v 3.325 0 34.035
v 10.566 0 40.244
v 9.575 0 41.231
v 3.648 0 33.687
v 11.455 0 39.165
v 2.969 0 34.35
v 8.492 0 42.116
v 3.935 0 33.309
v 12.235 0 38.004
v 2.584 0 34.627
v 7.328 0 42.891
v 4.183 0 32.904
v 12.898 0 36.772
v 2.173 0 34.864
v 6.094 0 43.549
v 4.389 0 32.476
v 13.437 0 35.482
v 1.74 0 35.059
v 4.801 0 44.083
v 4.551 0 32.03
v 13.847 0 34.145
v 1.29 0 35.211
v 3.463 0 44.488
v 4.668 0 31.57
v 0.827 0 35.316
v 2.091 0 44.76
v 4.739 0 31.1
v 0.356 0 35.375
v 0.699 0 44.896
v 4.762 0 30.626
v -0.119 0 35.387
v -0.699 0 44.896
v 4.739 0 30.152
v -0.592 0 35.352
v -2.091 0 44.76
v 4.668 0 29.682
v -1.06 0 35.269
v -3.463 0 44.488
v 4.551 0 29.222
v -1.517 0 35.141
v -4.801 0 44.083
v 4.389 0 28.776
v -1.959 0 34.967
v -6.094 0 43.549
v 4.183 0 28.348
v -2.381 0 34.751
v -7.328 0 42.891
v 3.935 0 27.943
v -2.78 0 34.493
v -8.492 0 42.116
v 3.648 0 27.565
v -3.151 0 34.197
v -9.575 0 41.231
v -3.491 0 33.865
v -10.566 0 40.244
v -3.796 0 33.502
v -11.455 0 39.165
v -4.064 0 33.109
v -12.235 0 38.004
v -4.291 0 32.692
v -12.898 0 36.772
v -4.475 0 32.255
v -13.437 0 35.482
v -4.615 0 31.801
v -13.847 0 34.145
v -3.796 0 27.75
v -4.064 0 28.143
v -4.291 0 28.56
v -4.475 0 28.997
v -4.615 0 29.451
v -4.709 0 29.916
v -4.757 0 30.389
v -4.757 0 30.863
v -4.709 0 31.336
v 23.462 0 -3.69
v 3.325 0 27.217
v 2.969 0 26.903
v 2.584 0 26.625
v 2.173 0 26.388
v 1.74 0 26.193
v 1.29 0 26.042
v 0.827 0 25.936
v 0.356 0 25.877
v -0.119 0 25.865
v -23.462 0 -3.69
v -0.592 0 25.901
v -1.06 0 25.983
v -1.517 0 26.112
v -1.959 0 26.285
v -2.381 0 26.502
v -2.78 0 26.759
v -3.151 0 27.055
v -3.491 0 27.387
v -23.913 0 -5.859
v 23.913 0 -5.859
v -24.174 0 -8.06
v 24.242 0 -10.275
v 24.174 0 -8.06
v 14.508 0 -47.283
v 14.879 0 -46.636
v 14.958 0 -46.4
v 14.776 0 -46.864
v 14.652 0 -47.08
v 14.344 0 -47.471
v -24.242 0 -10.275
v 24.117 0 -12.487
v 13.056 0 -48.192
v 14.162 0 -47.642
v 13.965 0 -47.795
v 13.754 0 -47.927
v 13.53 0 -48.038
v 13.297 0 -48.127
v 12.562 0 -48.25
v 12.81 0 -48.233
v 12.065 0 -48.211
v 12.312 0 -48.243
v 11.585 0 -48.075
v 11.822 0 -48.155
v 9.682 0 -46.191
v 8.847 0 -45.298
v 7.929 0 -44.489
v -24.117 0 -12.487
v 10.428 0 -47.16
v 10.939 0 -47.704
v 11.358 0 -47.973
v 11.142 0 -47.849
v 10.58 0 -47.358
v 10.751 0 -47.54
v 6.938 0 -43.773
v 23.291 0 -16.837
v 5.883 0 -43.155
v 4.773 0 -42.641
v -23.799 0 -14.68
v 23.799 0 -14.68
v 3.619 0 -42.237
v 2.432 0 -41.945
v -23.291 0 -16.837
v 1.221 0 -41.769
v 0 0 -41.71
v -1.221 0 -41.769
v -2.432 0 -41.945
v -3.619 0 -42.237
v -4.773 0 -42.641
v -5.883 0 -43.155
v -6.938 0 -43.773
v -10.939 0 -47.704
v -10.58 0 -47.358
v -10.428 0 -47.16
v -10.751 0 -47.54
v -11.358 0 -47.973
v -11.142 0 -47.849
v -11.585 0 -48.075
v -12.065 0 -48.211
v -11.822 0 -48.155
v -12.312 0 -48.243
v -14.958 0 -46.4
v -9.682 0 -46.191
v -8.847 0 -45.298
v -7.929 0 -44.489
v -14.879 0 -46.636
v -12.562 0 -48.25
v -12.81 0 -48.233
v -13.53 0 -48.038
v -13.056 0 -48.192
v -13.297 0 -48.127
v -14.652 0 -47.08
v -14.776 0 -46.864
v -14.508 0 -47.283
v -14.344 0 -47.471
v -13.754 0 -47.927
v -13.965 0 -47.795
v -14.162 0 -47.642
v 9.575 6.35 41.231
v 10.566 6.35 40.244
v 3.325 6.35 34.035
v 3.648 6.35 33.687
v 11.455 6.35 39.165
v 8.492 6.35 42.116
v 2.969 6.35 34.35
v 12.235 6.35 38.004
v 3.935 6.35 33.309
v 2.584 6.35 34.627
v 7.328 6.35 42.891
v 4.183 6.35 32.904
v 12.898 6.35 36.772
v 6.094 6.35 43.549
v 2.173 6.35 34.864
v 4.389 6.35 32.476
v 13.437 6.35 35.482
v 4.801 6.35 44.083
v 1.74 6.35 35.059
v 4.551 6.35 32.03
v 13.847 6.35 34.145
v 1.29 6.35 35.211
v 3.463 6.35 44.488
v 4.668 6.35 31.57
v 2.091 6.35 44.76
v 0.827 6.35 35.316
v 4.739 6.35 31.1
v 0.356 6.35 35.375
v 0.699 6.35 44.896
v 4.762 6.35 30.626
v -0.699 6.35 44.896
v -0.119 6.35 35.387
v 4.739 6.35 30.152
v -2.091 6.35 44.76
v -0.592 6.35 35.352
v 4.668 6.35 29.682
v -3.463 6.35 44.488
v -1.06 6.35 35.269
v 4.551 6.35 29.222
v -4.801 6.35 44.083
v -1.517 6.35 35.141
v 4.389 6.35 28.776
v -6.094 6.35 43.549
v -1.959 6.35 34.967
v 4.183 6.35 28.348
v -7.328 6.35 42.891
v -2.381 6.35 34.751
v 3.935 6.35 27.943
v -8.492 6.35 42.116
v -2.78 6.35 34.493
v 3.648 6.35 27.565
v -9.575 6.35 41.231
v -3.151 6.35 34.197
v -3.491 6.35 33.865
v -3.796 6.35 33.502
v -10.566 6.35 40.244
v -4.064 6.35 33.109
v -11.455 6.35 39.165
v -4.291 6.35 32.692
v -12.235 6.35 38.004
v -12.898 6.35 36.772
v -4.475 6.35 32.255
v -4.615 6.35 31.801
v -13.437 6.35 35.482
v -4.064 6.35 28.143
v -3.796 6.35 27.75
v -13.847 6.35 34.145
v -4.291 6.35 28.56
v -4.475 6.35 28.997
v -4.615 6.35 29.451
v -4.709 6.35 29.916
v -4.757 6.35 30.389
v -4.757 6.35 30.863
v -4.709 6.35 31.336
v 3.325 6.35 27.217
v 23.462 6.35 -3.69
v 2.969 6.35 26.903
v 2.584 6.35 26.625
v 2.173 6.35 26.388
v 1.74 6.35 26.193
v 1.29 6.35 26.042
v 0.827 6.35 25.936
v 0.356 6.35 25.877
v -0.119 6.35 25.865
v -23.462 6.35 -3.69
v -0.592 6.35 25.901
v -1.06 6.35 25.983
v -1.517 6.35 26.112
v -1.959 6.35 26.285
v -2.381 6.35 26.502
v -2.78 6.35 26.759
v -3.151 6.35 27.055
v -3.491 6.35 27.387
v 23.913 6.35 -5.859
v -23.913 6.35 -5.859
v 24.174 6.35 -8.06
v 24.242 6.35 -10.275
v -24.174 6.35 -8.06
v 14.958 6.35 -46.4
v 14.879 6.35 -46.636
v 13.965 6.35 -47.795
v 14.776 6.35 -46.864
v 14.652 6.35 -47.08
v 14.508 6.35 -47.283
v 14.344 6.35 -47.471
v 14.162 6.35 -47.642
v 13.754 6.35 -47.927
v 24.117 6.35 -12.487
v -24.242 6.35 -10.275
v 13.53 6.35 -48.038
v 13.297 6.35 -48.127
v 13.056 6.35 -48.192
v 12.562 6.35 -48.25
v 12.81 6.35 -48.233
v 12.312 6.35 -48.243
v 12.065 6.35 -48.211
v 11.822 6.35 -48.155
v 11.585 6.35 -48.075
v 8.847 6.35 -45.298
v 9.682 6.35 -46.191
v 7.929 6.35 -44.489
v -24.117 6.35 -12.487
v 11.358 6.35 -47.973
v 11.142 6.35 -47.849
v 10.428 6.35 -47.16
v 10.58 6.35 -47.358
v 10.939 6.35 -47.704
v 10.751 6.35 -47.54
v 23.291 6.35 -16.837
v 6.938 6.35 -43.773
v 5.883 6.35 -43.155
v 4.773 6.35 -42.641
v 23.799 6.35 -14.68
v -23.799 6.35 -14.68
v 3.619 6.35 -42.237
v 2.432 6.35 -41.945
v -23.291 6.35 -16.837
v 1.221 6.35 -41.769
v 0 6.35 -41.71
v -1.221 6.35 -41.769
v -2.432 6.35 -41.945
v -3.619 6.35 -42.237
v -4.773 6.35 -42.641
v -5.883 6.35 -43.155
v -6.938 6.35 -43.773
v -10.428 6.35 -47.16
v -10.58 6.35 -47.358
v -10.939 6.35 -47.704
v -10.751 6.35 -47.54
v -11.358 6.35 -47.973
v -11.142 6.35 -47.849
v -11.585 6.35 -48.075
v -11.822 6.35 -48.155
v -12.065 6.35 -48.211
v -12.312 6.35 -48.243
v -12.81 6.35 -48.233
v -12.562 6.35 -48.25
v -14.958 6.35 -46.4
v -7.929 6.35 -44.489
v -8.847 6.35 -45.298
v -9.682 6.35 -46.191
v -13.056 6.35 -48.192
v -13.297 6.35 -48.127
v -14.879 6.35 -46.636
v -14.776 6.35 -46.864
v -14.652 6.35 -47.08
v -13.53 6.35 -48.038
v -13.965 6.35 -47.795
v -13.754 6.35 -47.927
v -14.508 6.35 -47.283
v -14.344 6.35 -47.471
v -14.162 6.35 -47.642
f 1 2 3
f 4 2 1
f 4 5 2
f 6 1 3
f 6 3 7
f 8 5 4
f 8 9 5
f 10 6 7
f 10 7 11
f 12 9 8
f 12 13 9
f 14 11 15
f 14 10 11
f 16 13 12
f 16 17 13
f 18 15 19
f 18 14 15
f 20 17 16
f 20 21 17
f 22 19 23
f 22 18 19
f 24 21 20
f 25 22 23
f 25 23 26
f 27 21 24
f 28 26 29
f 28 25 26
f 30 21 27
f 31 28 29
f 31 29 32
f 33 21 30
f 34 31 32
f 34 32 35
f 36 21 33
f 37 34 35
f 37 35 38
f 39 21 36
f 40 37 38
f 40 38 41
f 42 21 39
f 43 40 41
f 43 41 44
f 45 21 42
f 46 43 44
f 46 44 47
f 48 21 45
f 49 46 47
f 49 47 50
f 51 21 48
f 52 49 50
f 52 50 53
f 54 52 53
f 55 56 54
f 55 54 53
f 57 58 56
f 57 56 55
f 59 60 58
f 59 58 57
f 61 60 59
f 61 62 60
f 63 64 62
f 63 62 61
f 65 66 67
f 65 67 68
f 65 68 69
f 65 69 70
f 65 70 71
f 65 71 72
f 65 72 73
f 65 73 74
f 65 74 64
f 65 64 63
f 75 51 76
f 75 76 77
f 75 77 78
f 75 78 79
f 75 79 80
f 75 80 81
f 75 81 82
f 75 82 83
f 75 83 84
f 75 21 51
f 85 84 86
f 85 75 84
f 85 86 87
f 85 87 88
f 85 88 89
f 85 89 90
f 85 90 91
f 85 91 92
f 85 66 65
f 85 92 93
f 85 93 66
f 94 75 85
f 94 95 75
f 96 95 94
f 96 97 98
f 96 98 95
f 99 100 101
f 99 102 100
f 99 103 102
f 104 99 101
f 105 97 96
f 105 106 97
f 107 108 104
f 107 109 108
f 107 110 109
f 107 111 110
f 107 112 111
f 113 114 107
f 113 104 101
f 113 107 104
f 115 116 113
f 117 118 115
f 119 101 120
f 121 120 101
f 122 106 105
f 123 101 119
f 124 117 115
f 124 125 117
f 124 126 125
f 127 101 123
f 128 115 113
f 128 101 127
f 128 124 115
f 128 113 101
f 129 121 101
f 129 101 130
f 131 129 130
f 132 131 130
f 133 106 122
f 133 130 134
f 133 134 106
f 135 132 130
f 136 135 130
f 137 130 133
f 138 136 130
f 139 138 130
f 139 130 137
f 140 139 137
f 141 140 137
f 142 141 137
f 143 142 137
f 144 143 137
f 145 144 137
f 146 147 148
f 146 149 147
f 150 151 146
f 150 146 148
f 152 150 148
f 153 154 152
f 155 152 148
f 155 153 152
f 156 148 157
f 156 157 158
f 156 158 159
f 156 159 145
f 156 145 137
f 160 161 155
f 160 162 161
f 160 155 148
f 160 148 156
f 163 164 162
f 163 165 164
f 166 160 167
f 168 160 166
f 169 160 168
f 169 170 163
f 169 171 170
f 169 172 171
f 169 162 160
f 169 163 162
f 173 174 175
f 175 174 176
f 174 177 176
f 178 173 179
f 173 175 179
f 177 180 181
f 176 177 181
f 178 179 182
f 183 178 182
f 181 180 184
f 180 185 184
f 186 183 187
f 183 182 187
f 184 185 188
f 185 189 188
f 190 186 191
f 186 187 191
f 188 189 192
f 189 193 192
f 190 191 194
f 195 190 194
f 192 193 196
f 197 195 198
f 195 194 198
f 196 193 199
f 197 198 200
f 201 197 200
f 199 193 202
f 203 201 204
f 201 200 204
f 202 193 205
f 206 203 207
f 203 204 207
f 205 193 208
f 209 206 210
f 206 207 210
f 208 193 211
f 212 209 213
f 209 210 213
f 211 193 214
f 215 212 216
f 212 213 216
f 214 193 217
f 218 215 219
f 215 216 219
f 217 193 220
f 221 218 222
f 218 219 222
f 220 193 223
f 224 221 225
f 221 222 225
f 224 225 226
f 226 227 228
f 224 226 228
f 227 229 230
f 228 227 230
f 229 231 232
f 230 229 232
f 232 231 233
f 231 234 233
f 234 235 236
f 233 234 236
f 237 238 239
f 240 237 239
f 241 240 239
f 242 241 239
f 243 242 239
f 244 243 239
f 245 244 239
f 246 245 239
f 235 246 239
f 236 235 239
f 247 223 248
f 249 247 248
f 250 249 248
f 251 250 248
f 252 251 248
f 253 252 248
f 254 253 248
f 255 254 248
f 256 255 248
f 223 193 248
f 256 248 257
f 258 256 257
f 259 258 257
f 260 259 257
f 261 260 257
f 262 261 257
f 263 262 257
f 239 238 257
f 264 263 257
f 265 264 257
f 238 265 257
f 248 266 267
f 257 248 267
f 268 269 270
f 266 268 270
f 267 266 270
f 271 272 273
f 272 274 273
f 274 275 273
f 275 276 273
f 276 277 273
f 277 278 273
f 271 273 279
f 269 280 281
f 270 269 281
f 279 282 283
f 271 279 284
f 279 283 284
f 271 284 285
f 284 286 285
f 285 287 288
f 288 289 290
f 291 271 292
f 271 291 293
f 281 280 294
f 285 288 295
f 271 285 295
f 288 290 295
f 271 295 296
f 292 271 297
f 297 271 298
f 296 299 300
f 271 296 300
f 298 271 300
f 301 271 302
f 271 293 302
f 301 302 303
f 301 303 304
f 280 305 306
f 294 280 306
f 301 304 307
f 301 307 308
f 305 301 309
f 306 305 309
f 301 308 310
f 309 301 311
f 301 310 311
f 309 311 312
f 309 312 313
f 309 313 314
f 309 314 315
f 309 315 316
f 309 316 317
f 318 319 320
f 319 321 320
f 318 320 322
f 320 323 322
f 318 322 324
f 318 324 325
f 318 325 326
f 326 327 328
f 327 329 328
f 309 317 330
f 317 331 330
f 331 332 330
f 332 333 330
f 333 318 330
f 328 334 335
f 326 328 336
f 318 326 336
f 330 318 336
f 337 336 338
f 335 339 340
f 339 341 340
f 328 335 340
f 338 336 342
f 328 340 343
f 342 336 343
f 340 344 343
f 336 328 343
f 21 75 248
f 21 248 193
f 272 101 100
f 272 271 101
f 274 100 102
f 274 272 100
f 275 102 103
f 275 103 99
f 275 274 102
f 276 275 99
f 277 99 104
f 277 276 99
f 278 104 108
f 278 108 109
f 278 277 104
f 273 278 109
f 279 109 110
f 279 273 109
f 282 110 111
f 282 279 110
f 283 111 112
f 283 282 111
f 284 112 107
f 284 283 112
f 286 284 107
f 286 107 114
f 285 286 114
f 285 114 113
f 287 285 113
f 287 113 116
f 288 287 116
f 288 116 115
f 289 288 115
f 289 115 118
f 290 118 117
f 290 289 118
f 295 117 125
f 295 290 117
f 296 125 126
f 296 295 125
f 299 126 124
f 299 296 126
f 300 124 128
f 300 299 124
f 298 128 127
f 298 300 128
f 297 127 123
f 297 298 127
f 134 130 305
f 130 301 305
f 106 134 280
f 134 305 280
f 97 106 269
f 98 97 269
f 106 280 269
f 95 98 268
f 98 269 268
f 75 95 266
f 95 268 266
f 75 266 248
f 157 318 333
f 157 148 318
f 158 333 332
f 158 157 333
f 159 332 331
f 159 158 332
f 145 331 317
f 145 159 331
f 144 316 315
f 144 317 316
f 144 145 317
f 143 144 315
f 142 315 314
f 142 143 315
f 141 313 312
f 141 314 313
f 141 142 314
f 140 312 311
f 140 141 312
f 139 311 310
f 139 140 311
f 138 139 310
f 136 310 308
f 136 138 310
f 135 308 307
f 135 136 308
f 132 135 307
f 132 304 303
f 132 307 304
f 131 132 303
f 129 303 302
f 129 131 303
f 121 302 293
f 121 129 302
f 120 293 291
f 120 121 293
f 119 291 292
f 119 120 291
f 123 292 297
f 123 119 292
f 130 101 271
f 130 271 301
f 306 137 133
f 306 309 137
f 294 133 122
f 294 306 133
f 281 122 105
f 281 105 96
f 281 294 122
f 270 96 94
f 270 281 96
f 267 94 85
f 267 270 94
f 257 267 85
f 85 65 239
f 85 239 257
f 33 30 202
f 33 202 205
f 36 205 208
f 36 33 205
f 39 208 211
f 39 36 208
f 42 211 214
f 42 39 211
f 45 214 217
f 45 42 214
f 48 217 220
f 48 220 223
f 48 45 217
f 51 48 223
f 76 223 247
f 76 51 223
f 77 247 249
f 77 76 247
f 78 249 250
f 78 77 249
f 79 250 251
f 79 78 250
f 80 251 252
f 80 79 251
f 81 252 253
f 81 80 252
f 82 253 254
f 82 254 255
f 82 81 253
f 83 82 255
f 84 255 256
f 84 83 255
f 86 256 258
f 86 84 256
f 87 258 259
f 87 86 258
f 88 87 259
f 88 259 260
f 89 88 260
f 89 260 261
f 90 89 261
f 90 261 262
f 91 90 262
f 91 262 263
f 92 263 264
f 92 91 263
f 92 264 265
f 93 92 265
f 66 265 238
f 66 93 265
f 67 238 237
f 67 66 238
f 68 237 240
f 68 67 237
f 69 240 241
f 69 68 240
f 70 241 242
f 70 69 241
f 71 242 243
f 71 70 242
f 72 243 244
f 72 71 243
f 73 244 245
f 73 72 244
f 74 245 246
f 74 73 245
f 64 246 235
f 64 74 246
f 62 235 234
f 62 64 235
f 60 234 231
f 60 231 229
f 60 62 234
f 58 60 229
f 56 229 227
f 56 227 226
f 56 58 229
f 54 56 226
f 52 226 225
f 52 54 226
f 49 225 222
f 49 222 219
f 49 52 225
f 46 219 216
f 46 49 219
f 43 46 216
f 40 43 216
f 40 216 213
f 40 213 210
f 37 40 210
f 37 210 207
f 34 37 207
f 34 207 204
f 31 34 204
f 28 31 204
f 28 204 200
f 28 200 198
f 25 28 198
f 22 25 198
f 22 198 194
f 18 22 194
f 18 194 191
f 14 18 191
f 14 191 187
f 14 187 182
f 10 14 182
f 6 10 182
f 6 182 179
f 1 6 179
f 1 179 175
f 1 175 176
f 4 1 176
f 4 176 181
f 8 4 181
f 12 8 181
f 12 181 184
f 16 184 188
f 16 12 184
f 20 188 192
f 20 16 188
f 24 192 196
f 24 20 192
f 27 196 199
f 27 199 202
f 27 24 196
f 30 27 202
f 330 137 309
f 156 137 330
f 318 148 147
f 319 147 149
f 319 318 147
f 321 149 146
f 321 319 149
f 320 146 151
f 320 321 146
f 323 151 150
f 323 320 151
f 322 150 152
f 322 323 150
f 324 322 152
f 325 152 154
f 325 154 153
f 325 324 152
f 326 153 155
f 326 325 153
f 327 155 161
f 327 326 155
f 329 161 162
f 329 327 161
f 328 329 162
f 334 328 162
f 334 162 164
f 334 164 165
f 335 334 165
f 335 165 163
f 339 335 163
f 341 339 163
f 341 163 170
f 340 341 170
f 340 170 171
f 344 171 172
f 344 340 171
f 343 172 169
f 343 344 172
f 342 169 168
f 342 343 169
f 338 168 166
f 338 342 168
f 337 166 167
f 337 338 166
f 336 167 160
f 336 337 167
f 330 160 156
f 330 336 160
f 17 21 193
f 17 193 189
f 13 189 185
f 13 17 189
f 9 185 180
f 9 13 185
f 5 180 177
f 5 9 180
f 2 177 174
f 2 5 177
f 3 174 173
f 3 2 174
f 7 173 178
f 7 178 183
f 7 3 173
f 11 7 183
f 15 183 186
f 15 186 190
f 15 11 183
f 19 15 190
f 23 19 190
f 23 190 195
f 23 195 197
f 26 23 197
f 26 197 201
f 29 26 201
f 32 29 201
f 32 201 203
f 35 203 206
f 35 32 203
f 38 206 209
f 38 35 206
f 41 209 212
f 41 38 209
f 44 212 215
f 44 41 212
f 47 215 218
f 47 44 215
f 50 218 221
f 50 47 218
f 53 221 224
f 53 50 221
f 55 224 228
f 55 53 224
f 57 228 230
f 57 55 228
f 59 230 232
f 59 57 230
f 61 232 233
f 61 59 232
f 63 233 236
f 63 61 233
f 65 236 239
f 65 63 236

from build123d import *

# Parameters (mm, degrees)
SKETCH13_R              = 4.7625
BOSS_EXTRUDE1_DEPTH     = 6.35
SKETCH14_R              = 12.7
CUT_EXTRUDE1_DEPTH      = 7.35
CUT_EXTRUDE1_DEPTH_BACK = 1
FILLET1_R               = 2.54
FILLET2_R               = 25.4


with BuildPart() as part:
    # Sketch13 → Boss-Extrude1 (new body)
    with BuildSketch(Plane(origin=(0, 0, 0), x_dir=(1, 0, 0), z_dir=(0, 1, 0))):
        with BuildLine():
            Line((12.7, 54.409872551), (25.137792916, 10.286231112))
            Line((25.137792916, 10.286231112), (13.84741683, -34.144859739))
            ThreePointArc((13.84741683, -34.144859739), (0, -44.913595269), (-13.84741683, -34.144859739))
            Line((-13.84741683, -34.144859739), (-25.137792916, 10.286231112))
            Line((-25.137792916, 10.286231112), (-12.7, 54.409872551))
            Line((-12.7, 54.409872551), (12.7, 54.409872551))
        make_face()
        with Locations((0, -30.626095269)):
            Circle(SKETCH13_R, mode=Mode.SUBTRACT)
    extrude(amount=BOSS_EXTRUDE1_DEPTH)

    # Sketch14 → Cut-Extrude1 (cut, two sides)
    with BuildSketch(Plane(origin=(0, 0, 0), x_dir=(1, 0, 0), z_dir=(0, 1, 0))) as cut_extrude1_sk:
        with Locations((0, 54.409872551)):
            Circle(SKETCH14_R)
    extrude(amount=CUT_EXTRUDE1_DEPTH, mode=Mode.SUBTRACT)
    extrude(cut_extrude1_sk.sketch, amount=-CUT_EXTRUDE1_DEPTH_BACK, mode=Mode.SUBTRACT)

    # Fillet1
    fillet1_edges = [part.edges().sort_by_distance(p)[0] for p in [
        (12.7, 3.175, -54.409872551),
        (-12.7, 3.175, -54.409872551),
    ]]
    fillet(fillet1_edges, radius=FILLET1_R)

    # Fillet2
    fillet2_edges = [part.edges().sort_by_distance(p)[0] for p in [
        (25.137792916, 3.175, -10.286231112),
        (-25.137792916, 3.175, -10.286231112),
    ]]
    fillet(fillet2_edges, radius=FILLET2_R)


solid = part.part
